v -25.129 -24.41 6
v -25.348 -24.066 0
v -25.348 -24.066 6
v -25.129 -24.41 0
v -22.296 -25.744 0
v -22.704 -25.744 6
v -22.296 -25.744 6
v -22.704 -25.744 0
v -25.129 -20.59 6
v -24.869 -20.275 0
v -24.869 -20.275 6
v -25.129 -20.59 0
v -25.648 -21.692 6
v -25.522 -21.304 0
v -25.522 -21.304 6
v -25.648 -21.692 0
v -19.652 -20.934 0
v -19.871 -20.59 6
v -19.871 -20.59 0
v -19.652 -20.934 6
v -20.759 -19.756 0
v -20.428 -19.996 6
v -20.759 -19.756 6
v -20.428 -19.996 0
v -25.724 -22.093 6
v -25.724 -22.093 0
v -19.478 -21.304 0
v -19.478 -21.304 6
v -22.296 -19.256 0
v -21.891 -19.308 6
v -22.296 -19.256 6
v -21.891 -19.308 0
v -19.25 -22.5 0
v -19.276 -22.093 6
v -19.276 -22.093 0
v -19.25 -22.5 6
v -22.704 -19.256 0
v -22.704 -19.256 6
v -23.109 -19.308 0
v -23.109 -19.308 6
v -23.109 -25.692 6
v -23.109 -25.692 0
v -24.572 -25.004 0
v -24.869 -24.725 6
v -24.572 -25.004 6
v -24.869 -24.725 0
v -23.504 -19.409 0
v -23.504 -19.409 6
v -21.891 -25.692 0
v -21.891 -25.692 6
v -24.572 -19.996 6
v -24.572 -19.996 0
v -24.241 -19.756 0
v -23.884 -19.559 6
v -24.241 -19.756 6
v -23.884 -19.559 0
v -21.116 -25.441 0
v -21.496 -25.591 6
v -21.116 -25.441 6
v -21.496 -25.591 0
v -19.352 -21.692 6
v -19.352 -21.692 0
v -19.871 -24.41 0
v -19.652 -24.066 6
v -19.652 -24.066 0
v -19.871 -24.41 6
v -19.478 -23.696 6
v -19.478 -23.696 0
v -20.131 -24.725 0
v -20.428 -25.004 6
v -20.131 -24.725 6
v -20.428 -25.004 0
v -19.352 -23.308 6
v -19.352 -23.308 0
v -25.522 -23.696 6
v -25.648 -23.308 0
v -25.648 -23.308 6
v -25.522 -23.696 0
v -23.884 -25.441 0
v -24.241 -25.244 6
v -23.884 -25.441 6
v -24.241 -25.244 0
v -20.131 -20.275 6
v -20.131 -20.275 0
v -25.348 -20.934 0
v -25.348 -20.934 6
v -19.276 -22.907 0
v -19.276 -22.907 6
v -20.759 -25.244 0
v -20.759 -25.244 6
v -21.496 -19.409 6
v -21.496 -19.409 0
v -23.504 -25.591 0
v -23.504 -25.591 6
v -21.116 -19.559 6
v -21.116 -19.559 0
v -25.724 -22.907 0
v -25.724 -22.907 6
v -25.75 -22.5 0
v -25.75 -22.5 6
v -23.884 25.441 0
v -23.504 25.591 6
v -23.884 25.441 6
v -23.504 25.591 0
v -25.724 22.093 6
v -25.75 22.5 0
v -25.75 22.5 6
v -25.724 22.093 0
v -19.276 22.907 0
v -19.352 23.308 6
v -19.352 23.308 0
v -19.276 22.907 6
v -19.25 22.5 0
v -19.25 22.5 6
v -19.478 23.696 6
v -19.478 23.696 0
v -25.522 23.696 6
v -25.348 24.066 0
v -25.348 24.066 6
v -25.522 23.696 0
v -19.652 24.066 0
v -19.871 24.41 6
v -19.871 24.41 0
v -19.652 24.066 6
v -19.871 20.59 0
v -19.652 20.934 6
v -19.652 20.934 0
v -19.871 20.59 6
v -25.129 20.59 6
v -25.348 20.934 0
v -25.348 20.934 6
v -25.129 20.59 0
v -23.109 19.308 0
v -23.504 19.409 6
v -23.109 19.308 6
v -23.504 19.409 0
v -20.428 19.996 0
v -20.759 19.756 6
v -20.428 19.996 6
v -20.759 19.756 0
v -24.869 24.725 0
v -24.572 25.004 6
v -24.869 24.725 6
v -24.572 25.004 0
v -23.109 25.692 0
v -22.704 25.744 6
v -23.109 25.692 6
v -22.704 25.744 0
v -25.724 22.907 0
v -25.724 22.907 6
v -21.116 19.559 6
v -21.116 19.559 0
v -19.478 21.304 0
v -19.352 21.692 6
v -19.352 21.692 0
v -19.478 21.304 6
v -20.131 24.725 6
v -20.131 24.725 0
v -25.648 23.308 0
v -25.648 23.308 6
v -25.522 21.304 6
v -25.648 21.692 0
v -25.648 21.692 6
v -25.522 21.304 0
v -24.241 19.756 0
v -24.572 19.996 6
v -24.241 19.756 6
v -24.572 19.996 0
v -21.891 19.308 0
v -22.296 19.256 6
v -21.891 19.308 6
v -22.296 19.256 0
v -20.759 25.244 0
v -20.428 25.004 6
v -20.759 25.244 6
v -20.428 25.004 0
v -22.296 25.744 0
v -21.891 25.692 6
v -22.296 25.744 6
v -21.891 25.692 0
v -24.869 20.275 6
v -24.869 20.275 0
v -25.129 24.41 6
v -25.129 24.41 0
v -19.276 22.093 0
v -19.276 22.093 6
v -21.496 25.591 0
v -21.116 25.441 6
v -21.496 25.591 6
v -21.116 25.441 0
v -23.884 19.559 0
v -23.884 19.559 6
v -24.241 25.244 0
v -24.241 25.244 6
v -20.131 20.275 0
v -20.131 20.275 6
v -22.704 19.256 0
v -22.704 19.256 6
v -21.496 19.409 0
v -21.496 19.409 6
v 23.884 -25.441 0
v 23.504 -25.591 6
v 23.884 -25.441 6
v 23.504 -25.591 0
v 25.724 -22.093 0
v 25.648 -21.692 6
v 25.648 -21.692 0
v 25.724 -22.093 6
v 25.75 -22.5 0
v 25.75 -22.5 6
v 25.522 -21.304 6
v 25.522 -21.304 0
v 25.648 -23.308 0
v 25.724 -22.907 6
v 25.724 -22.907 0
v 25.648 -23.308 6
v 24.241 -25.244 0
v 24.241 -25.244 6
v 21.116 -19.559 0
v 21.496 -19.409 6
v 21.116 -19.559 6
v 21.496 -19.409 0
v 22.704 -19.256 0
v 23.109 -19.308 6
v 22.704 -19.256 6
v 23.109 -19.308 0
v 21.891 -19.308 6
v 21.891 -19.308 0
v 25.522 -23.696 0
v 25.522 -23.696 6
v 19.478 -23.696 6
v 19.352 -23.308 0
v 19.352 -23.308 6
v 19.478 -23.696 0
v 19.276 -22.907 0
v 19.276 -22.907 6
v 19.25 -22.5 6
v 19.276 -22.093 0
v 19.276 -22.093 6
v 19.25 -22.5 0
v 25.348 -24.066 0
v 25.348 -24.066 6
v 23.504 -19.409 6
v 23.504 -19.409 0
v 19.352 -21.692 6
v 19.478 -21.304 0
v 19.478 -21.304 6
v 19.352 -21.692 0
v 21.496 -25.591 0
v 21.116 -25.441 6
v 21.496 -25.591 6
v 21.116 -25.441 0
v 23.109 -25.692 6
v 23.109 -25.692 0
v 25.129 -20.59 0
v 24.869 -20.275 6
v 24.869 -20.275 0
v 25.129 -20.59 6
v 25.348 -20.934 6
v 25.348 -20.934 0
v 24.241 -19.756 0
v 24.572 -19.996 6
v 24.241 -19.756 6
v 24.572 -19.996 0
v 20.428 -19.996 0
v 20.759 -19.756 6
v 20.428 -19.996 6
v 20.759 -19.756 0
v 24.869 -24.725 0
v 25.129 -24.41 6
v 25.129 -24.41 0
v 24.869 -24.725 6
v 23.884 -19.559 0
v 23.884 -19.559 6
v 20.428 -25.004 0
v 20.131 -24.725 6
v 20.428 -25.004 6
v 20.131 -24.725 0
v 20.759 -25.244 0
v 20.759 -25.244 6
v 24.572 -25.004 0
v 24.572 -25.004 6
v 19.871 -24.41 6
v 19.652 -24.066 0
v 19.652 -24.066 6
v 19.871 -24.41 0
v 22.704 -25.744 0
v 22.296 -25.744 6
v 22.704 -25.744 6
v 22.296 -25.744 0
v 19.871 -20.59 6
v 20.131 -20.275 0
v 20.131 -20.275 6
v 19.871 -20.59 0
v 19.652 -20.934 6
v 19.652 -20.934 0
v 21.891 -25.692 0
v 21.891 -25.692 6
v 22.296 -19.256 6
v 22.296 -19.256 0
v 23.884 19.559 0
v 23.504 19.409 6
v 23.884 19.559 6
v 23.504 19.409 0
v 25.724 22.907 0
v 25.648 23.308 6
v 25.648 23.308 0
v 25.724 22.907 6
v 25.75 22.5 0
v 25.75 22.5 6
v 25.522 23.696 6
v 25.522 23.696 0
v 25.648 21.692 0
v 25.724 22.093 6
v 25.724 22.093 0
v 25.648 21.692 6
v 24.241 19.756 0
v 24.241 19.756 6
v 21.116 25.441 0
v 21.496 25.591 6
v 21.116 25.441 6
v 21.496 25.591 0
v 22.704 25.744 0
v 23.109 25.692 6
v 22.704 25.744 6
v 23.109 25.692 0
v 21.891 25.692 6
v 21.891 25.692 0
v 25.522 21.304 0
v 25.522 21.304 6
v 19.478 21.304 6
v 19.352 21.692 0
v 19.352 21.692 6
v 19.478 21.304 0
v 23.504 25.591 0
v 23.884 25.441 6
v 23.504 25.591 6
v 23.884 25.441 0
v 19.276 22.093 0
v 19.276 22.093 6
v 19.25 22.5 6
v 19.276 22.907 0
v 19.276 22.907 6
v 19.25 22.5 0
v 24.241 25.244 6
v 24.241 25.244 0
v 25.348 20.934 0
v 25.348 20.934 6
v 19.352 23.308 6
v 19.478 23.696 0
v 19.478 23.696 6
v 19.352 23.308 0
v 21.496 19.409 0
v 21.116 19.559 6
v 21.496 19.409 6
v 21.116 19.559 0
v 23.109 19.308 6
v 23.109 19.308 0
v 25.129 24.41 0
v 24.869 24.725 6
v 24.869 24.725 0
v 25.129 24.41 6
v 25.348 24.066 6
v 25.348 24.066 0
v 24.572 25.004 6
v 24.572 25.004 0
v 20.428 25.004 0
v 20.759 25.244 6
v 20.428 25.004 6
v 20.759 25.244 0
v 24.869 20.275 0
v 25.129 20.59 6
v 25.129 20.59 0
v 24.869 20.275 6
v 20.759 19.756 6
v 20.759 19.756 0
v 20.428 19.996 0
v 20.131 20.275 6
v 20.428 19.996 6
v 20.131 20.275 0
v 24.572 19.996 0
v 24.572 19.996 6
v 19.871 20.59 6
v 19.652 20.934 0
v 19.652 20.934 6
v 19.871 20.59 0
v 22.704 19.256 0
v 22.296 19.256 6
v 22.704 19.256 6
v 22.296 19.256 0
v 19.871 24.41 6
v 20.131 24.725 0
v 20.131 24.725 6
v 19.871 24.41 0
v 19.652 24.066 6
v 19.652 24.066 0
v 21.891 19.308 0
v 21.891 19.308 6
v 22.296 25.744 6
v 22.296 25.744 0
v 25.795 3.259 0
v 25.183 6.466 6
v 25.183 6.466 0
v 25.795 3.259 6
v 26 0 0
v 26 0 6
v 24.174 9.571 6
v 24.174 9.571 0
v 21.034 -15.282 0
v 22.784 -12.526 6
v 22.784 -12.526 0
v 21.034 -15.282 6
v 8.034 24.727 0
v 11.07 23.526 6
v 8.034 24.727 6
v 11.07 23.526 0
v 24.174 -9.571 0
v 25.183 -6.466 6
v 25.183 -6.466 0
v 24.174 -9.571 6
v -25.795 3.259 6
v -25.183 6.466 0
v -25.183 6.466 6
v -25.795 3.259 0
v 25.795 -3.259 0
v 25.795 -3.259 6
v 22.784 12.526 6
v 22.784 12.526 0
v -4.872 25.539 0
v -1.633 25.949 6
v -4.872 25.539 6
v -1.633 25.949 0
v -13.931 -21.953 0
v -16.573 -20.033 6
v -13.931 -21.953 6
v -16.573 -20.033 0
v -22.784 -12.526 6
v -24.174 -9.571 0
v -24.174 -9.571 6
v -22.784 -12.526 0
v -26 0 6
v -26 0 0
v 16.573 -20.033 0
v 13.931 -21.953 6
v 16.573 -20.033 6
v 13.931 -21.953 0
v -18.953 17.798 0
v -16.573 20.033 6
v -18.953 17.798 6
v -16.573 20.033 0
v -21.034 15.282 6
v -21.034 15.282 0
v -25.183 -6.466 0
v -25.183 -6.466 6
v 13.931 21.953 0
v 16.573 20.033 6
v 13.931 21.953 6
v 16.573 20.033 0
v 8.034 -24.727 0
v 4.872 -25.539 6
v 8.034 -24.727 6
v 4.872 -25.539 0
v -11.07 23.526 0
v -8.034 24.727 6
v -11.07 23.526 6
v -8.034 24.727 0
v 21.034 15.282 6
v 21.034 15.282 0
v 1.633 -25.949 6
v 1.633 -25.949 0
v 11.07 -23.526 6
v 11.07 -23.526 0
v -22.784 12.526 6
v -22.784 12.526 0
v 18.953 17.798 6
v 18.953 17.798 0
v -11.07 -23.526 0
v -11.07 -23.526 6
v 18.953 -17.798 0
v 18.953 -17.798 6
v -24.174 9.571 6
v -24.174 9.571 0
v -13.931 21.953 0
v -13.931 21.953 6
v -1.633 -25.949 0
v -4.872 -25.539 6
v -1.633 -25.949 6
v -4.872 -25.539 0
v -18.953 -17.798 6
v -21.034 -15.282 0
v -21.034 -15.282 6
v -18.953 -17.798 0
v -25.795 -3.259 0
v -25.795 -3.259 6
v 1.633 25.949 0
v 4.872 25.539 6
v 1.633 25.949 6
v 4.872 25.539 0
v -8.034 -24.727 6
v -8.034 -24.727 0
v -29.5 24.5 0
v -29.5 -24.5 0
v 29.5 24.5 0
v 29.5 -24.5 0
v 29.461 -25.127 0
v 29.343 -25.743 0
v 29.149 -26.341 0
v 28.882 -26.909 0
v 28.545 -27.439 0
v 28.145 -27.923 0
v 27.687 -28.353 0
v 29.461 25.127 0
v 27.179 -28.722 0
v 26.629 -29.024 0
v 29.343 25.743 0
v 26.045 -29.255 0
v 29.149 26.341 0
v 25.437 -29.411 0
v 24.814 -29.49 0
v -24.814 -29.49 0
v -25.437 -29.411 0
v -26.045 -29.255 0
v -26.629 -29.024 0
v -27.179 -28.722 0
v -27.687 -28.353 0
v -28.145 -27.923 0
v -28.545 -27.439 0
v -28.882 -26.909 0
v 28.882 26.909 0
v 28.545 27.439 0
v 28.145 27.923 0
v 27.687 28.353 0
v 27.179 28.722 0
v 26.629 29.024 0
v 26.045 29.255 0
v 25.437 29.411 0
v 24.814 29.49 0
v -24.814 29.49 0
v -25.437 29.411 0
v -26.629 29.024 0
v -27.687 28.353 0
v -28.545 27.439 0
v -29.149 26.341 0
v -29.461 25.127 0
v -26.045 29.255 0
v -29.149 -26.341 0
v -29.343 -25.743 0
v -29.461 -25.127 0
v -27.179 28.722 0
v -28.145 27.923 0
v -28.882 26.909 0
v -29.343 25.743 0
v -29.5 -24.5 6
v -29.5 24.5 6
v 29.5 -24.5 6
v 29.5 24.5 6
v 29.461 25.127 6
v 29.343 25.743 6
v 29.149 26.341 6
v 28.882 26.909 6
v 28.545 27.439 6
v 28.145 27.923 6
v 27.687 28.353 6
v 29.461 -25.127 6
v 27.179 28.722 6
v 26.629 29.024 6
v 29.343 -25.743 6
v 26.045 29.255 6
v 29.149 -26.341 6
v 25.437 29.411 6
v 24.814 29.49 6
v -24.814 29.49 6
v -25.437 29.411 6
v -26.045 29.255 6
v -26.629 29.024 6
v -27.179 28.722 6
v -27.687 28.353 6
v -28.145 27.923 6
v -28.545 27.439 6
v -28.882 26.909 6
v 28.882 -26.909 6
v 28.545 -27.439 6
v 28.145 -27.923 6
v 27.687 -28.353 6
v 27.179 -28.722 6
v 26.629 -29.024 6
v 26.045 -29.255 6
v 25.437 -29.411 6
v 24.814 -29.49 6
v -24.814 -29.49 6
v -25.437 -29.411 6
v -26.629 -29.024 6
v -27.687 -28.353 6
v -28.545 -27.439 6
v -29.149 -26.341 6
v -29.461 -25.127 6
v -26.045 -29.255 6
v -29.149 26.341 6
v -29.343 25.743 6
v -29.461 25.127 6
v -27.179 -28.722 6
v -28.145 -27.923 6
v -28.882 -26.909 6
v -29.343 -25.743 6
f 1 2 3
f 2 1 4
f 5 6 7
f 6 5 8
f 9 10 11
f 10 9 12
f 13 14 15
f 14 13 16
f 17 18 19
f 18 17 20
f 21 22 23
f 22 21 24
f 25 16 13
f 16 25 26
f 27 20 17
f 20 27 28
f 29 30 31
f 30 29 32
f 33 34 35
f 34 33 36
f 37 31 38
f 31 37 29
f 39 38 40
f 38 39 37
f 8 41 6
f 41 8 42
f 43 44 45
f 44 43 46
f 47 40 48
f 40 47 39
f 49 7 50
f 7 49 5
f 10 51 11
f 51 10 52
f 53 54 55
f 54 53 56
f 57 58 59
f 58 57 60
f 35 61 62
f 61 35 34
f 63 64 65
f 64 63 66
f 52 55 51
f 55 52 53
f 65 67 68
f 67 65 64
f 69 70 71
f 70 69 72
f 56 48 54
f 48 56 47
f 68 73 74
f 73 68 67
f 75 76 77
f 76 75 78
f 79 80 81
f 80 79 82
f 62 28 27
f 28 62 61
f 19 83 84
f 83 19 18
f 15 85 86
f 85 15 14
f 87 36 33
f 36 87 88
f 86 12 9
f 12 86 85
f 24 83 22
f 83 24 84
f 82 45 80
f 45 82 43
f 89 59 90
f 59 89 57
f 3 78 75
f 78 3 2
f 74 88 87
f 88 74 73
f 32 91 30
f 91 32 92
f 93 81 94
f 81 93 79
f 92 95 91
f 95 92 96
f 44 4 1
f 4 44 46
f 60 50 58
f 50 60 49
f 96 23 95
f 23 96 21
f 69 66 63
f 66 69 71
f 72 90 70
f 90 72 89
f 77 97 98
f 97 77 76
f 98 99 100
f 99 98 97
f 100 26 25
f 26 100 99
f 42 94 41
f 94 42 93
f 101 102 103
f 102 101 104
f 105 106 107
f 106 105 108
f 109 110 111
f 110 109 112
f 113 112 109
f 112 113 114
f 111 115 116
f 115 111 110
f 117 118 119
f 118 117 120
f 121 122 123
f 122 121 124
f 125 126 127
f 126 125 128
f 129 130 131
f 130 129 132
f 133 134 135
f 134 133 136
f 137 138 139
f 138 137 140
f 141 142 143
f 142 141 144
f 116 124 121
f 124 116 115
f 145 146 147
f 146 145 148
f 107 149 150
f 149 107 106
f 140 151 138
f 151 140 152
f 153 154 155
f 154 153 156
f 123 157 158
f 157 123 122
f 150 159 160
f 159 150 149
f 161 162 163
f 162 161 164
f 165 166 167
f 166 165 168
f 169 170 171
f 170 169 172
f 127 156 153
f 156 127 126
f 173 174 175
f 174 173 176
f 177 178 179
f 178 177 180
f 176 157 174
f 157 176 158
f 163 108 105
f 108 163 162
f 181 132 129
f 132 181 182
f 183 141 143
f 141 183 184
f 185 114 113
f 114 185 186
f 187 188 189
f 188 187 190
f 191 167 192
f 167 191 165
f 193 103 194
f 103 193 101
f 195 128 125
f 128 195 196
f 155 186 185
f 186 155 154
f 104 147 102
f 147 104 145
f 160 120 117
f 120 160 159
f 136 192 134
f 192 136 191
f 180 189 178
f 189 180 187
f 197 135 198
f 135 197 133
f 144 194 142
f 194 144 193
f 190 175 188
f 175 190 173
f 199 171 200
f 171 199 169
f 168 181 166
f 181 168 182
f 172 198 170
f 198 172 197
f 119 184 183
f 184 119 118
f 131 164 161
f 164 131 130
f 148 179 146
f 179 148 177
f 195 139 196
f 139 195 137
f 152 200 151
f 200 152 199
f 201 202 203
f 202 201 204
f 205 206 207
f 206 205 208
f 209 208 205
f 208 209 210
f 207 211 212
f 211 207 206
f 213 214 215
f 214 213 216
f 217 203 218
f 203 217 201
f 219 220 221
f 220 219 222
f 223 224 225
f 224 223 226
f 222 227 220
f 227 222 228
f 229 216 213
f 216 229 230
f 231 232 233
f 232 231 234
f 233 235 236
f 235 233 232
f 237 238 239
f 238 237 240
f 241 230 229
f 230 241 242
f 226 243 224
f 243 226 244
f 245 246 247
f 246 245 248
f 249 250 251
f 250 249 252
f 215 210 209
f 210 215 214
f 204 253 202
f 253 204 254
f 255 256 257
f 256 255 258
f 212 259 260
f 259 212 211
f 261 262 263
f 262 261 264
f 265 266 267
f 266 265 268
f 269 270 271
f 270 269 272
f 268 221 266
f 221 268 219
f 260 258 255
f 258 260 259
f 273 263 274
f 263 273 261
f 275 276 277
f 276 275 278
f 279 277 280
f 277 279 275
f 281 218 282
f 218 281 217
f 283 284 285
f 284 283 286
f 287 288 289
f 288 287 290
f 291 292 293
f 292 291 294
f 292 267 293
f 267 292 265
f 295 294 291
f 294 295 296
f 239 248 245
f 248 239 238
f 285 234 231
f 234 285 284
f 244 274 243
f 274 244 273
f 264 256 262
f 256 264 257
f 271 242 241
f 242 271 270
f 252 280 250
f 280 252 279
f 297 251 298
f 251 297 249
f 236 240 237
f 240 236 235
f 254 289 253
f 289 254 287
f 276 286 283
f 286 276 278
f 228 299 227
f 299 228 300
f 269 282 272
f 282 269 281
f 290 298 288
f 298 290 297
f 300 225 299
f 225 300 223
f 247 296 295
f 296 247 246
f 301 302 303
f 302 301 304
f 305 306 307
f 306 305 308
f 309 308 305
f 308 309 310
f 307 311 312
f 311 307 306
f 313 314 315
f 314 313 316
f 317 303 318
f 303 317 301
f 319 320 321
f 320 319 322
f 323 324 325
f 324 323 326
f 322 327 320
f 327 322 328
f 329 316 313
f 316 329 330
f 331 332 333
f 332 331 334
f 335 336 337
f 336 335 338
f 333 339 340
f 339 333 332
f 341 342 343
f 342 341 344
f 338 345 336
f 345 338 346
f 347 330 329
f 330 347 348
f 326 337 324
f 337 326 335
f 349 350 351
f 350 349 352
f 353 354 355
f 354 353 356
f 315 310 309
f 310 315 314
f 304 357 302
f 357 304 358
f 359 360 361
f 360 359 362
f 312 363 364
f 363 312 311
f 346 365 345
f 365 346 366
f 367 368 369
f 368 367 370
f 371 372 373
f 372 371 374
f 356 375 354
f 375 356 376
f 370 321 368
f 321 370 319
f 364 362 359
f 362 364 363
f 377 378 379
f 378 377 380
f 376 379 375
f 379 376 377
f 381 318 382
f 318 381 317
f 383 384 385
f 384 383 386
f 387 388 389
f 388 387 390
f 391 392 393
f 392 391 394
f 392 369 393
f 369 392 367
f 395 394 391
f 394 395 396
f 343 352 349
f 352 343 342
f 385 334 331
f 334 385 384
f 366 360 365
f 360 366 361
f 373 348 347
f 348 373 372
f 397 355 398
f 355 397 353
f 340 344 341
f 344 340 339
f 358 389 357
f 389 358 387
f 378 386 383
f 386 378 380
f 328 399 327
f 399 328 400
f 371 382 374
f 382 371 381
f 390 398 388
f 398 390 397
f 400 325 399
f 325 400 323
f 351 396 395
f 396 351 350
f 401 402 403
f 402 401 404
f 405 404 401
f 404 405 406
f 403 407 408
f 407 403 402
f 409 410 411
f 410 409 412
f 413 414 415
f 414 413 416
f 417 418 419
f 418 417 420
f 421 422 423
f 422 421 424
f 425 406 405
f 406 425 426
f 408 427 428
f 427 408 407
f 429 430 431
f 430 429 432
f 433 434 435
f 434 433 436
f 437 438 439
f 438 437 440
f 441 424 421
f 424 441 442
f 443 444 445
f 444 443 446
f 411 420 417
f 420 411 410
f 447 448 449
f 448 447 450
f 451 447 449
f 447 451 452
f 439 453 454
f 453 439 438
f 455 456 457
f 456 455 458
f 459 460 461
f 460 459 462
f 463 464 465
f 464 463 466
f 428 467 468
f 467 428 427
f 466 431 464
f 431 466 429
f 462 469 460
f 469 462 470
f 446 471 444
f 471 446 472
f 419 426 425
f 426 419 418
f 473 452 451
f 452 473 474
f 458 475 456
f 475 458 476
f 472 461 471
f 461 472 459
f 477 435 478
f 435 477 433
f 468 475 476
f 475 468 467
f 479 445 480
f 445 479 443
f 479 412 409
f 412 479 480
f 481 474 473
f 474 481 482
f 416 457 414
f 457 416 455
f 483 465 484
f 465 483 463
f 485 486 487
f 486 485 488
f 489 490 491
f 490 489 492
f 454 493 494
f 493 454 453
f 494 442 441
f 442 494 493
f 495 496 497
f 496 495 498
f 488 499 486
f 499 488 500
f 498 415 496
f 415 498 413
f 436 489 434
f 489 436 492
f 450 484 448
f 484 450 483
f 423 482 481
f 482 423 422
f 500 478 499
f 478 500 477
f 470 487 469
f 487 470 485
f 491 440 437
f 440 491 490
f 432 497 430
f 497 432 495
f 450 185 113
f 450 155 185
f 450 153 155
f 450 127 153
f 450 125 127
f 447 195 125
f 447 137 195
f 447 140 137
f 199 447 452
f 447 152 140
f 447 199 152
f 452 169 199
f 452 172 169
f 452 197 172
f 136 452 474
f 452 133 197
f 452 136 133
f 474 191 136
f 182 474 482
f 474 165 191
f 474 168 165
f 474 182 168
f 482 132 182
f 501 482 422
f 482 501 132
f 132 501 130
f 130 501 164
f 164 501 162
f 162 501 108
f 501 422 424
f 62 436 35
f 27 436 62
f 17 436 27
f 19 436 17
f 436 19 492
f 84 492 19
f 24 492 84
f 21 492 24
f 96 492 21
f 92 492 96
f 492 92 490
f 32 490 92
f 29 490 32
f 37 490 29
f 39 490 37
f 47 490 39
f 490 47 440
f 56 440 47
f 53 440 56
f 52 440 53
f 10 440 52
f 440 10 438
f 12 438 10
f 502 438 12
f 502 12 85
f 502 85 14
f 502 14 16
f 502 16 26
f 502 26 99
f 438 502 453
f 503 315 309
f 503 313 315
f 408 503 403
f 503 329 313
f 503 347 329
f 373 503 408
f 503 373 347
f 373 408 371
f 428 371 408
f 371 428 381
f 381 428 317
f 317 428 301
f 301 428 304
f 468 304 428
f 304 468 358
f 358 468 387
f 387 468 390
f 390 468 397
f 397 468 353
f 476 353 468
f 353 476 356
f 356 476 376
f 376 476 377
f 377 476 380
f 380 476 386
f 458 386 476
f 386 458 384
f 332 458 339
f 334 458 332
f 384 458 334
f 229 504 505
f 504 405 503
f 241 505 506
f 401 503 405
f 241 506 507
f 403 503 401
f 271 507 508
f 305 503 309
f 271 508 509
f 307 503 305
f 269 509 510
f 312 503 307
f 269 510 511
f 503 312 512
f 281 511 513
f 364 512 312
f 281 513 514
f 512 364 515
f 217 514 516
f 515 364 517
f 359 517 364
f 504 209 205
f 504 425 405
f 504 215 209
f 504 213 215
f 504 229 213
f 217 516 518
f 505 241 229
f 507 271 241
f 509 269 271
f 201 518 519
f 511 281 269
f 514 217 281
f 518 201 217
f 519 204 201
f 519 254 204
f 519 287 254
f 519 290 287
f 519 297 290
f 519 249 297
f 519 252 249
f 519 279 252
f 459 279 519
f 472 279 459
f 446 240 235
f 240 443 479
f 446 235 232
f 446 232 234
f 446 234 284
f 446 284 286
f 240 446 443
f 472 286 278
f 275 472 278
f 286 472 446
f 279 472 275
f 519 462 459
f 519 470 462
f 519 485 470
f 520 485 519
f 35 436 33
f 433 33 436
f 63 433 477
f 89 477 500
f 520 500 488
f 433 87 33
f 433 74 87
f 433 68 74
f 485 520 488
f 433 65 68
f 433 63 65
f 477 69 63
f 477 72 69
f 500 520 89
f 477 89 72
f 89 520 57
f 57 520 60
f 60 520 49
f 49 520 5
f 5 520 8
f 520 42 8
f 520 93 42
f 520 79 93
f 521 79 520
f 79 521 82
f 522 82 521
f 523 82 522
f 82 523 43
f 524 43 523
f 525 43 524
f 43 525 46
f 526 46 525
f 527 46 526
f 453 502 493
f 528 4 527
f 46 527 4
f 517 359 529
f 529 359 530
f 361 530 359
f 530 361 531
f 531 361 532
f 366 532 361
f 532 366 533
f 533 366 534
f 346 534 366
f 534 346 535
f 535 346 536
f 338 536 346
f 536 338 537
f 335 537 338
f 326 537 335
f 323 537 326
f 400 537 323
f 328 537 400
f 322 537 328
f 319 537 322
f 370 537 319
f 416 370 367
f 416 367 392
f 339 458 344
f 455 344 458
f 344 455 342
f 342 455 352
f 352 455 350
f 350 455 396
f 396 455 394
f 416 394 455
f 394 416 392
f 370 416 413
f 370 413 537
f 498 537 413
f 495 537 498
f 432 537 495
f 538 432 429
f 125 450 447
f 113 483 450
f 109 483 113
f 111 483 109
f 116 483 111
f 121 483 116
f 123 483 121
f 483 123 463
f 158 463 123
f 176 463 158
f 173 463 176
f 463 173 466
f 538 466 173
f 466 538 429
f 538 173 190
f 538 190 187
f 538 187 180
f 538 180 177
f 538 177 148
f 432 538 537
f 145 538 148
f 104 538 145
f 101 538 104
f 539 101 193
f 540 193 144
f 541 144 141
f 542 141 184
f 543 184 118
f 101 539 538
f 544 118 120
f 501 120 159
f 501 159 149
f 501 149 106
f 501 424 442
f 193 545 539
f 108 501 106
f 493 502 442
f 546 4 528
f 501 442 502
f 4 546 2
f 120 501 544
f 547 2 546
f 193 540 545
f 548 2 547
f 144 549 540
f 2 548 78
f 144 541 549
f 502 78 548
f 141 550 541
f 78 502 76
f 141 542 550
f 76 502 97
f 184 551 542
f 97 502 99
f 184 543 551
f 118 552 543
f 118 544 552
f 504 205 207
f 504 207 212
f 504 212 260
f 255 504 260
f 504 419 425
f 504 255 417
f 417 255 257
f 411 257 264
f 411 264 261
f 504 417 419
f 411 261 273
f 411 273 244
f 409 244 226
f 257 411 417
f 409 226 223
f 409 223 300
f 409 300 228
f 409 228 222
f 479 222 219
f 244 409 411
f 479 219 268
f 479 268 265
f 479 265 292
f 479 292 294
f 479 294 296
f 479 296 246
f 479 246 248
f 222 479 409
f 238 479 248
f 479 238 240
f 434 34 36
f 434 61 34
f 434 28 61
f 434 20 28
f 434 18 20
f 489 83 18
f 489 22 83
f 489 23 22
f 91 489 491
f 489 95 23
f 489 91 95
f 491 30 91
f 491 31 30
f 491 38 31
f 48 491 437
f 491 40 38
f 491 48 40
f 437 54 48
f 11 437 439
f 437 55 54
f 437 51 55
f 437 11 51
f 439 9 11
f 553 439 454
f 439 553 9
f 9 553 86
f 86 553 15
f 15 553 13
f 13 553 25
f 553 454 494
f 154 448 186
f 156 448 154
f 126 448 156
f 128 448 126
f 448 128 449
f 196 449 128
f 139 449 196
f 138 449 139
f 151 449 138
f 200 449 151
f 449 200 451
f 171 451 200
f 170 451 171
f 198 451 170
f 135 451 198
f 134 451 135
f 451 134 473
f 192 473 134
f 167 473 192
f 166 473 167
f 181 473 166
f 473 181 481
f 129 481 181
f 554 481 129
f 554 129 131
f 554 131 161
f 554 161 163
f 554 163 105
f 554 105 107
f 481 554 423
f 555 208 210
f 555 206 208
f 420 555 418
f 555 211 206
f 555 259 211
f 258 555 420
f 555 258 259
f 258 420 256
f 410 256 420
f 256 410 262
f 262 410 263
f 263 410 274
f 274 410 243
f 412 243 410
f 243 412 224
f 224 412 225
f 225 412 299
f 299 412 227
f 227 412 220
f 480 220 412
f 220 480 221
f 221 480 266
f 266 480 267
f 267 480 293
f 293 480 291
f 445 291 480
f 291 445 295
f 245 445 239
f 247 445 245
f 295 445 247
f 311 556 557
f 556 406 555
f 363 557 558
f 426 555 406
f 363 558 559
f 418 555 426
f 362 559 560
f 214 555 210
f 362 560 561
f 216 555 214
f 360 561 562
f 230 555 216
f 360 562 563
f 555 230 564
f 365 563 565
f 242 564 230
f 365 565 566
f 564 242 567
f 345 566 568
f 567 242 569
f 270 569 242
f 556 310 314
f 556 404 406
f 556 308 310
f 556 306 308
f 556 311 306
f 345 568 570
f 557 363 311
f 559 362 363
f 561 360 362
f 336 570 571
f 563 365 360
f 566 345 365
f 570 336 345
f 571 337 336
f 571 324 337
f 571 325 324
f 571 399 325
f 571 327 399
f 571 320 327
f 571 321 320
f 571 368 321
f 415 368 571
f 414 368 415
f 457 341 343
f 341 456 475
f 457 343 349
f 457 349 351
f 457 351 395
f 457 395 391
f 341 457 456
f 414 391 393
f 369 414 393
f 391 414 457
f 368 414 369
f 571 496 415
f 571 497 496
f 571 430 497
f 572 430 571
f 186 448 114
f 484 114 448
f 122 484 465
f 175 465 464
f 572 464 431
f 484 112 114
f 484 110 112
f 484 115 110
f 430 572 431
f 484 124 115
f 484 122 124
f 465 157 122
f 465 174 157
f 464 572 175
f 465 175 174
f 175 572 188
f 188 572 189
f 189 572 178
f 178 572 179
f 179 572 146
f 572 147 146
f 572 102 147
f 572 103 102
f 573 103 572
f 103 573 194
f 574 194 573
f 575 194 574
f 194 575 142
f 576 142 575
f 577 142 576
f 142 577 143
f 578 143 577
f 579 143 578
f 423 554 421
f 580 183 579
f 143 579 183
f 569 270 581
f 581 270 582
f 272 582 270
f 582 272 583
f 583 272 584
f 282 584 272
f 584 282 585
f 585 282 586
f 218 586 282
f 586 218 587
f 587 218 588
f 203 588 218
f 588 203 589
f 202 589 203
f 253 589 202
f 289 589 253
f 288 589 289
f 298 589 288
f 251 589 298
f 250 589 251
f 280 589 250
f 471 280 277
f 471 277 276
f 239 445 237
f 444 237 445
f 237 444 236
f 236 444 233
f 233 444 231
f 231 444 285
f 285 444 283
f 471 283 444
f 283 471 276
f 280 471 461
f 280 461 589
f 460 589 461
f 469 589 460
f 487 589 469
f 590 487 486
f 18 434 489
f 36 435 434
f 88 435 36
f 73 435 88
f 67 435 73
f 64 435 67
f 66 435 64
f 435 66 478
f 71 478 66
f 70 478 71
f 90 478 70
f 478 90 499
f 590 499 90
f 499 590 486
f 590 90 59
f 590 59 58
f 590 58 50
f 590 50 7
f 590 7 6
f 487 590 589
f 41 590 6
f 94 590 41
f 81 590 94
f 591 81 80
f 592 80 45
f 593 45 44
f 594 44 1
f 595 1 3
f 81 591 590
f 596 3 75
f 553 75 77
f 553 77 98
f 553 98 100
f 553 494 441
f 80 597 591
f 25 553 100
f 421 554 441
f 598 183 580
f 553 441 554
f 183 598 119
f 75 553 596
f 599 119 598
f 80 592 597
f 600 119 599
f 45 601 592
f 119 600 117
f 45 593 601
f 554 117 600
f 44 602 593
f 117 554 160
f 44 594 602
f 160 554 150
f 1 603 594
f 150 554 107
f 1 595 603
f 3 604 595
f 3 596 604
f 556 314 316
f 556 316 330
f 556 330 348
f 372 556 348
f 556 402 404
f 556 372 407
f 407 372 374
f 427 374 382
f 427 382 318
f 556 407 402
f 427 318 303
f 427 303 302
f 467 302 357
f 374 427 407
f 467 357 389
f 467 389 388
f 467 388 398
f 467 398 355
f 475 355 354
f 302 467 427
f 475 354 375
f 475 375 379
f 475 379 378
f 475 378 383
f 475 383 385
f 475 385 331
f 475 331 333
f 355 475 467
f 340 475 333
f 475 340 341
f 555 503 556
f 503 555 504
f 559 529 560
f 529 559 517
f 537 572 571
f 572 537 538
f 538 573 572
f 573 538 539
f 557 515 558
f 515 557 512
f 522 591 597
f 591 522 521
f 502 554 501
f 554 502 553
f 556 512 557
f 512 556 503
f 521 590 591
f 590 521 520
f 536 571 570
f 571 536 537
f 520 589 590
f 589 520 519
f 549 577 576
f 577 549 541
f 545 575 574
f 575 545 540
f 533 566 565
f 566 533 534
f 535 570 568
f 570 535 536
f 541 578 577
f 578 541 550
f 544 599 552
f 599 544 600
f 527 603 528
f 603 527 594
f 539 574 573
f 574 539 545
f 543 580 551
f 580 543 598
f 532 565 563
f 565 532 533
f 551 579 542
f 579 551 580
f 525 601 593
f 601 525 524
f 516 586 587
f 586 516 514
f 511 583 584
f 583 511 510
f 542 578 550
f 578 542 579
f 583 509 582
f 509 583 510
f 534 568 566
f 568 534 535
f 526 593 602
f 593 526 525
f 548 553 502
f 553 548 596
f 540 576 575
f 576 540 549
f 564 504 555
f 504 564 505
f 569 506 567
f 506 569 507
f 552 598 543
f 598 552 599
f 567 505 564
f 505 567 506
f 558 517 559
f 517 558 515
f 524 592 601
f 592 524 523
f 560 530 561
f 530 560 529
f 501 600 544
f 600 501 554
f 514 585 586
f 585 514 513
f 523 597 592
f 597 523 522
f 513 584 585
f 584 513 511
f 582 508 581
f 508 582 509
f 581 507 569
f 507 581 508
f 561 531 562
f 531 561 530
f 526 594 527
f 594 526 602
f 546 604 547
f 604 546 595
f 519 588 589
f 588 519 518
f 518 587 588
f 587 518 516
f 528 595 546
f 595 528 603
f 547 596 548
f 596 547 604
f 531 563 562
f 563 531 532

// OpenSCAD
$fn = 50;


difference() {
	union() {
		hull() {
			translate(v = [-24.5000000000, 24.5000000000, 0]) {
				cylinder(h = 6, r = 5);
			}
			translate(v = [24.5000000000, 24.5000000000, 0]) {
				cylinder(h = 6, r = 5);
			}
			translate(v = [-24.5000000000, -24.5000000000, 0]) {
				cylinder(h = 6, r = 5);
			}
			translate(v = [24.5000000000, -24.5000000000, 0]) {
				cylinder(h = 6, r = 5);
			}
		}
	}
	union() {
		#translate(v = [-22.5000000000, -22.5000000000, -100.0000000000]) {
			cylinder(h = 200, r = 3.2500000000);
		}
		#translate(v = [-22.5000000000, 22.5000000000, -100.0000000000]) {
			cylinder(h = 200, r = 3.2500000000);
		}
		#translate(v = [22.5000000000, -22.5000000000, -100.0000000000]) {
			cylinder(h = 200, r = 3.2500000000);
		}
		#translate(v = [22.5000000000, 22.5000000000, -100.0000000000]) {
			cylinder(h = 200, r = 3.2500000000);
		}
		#cylinder(h = 6, r = 26.0000000000);
	}
}
